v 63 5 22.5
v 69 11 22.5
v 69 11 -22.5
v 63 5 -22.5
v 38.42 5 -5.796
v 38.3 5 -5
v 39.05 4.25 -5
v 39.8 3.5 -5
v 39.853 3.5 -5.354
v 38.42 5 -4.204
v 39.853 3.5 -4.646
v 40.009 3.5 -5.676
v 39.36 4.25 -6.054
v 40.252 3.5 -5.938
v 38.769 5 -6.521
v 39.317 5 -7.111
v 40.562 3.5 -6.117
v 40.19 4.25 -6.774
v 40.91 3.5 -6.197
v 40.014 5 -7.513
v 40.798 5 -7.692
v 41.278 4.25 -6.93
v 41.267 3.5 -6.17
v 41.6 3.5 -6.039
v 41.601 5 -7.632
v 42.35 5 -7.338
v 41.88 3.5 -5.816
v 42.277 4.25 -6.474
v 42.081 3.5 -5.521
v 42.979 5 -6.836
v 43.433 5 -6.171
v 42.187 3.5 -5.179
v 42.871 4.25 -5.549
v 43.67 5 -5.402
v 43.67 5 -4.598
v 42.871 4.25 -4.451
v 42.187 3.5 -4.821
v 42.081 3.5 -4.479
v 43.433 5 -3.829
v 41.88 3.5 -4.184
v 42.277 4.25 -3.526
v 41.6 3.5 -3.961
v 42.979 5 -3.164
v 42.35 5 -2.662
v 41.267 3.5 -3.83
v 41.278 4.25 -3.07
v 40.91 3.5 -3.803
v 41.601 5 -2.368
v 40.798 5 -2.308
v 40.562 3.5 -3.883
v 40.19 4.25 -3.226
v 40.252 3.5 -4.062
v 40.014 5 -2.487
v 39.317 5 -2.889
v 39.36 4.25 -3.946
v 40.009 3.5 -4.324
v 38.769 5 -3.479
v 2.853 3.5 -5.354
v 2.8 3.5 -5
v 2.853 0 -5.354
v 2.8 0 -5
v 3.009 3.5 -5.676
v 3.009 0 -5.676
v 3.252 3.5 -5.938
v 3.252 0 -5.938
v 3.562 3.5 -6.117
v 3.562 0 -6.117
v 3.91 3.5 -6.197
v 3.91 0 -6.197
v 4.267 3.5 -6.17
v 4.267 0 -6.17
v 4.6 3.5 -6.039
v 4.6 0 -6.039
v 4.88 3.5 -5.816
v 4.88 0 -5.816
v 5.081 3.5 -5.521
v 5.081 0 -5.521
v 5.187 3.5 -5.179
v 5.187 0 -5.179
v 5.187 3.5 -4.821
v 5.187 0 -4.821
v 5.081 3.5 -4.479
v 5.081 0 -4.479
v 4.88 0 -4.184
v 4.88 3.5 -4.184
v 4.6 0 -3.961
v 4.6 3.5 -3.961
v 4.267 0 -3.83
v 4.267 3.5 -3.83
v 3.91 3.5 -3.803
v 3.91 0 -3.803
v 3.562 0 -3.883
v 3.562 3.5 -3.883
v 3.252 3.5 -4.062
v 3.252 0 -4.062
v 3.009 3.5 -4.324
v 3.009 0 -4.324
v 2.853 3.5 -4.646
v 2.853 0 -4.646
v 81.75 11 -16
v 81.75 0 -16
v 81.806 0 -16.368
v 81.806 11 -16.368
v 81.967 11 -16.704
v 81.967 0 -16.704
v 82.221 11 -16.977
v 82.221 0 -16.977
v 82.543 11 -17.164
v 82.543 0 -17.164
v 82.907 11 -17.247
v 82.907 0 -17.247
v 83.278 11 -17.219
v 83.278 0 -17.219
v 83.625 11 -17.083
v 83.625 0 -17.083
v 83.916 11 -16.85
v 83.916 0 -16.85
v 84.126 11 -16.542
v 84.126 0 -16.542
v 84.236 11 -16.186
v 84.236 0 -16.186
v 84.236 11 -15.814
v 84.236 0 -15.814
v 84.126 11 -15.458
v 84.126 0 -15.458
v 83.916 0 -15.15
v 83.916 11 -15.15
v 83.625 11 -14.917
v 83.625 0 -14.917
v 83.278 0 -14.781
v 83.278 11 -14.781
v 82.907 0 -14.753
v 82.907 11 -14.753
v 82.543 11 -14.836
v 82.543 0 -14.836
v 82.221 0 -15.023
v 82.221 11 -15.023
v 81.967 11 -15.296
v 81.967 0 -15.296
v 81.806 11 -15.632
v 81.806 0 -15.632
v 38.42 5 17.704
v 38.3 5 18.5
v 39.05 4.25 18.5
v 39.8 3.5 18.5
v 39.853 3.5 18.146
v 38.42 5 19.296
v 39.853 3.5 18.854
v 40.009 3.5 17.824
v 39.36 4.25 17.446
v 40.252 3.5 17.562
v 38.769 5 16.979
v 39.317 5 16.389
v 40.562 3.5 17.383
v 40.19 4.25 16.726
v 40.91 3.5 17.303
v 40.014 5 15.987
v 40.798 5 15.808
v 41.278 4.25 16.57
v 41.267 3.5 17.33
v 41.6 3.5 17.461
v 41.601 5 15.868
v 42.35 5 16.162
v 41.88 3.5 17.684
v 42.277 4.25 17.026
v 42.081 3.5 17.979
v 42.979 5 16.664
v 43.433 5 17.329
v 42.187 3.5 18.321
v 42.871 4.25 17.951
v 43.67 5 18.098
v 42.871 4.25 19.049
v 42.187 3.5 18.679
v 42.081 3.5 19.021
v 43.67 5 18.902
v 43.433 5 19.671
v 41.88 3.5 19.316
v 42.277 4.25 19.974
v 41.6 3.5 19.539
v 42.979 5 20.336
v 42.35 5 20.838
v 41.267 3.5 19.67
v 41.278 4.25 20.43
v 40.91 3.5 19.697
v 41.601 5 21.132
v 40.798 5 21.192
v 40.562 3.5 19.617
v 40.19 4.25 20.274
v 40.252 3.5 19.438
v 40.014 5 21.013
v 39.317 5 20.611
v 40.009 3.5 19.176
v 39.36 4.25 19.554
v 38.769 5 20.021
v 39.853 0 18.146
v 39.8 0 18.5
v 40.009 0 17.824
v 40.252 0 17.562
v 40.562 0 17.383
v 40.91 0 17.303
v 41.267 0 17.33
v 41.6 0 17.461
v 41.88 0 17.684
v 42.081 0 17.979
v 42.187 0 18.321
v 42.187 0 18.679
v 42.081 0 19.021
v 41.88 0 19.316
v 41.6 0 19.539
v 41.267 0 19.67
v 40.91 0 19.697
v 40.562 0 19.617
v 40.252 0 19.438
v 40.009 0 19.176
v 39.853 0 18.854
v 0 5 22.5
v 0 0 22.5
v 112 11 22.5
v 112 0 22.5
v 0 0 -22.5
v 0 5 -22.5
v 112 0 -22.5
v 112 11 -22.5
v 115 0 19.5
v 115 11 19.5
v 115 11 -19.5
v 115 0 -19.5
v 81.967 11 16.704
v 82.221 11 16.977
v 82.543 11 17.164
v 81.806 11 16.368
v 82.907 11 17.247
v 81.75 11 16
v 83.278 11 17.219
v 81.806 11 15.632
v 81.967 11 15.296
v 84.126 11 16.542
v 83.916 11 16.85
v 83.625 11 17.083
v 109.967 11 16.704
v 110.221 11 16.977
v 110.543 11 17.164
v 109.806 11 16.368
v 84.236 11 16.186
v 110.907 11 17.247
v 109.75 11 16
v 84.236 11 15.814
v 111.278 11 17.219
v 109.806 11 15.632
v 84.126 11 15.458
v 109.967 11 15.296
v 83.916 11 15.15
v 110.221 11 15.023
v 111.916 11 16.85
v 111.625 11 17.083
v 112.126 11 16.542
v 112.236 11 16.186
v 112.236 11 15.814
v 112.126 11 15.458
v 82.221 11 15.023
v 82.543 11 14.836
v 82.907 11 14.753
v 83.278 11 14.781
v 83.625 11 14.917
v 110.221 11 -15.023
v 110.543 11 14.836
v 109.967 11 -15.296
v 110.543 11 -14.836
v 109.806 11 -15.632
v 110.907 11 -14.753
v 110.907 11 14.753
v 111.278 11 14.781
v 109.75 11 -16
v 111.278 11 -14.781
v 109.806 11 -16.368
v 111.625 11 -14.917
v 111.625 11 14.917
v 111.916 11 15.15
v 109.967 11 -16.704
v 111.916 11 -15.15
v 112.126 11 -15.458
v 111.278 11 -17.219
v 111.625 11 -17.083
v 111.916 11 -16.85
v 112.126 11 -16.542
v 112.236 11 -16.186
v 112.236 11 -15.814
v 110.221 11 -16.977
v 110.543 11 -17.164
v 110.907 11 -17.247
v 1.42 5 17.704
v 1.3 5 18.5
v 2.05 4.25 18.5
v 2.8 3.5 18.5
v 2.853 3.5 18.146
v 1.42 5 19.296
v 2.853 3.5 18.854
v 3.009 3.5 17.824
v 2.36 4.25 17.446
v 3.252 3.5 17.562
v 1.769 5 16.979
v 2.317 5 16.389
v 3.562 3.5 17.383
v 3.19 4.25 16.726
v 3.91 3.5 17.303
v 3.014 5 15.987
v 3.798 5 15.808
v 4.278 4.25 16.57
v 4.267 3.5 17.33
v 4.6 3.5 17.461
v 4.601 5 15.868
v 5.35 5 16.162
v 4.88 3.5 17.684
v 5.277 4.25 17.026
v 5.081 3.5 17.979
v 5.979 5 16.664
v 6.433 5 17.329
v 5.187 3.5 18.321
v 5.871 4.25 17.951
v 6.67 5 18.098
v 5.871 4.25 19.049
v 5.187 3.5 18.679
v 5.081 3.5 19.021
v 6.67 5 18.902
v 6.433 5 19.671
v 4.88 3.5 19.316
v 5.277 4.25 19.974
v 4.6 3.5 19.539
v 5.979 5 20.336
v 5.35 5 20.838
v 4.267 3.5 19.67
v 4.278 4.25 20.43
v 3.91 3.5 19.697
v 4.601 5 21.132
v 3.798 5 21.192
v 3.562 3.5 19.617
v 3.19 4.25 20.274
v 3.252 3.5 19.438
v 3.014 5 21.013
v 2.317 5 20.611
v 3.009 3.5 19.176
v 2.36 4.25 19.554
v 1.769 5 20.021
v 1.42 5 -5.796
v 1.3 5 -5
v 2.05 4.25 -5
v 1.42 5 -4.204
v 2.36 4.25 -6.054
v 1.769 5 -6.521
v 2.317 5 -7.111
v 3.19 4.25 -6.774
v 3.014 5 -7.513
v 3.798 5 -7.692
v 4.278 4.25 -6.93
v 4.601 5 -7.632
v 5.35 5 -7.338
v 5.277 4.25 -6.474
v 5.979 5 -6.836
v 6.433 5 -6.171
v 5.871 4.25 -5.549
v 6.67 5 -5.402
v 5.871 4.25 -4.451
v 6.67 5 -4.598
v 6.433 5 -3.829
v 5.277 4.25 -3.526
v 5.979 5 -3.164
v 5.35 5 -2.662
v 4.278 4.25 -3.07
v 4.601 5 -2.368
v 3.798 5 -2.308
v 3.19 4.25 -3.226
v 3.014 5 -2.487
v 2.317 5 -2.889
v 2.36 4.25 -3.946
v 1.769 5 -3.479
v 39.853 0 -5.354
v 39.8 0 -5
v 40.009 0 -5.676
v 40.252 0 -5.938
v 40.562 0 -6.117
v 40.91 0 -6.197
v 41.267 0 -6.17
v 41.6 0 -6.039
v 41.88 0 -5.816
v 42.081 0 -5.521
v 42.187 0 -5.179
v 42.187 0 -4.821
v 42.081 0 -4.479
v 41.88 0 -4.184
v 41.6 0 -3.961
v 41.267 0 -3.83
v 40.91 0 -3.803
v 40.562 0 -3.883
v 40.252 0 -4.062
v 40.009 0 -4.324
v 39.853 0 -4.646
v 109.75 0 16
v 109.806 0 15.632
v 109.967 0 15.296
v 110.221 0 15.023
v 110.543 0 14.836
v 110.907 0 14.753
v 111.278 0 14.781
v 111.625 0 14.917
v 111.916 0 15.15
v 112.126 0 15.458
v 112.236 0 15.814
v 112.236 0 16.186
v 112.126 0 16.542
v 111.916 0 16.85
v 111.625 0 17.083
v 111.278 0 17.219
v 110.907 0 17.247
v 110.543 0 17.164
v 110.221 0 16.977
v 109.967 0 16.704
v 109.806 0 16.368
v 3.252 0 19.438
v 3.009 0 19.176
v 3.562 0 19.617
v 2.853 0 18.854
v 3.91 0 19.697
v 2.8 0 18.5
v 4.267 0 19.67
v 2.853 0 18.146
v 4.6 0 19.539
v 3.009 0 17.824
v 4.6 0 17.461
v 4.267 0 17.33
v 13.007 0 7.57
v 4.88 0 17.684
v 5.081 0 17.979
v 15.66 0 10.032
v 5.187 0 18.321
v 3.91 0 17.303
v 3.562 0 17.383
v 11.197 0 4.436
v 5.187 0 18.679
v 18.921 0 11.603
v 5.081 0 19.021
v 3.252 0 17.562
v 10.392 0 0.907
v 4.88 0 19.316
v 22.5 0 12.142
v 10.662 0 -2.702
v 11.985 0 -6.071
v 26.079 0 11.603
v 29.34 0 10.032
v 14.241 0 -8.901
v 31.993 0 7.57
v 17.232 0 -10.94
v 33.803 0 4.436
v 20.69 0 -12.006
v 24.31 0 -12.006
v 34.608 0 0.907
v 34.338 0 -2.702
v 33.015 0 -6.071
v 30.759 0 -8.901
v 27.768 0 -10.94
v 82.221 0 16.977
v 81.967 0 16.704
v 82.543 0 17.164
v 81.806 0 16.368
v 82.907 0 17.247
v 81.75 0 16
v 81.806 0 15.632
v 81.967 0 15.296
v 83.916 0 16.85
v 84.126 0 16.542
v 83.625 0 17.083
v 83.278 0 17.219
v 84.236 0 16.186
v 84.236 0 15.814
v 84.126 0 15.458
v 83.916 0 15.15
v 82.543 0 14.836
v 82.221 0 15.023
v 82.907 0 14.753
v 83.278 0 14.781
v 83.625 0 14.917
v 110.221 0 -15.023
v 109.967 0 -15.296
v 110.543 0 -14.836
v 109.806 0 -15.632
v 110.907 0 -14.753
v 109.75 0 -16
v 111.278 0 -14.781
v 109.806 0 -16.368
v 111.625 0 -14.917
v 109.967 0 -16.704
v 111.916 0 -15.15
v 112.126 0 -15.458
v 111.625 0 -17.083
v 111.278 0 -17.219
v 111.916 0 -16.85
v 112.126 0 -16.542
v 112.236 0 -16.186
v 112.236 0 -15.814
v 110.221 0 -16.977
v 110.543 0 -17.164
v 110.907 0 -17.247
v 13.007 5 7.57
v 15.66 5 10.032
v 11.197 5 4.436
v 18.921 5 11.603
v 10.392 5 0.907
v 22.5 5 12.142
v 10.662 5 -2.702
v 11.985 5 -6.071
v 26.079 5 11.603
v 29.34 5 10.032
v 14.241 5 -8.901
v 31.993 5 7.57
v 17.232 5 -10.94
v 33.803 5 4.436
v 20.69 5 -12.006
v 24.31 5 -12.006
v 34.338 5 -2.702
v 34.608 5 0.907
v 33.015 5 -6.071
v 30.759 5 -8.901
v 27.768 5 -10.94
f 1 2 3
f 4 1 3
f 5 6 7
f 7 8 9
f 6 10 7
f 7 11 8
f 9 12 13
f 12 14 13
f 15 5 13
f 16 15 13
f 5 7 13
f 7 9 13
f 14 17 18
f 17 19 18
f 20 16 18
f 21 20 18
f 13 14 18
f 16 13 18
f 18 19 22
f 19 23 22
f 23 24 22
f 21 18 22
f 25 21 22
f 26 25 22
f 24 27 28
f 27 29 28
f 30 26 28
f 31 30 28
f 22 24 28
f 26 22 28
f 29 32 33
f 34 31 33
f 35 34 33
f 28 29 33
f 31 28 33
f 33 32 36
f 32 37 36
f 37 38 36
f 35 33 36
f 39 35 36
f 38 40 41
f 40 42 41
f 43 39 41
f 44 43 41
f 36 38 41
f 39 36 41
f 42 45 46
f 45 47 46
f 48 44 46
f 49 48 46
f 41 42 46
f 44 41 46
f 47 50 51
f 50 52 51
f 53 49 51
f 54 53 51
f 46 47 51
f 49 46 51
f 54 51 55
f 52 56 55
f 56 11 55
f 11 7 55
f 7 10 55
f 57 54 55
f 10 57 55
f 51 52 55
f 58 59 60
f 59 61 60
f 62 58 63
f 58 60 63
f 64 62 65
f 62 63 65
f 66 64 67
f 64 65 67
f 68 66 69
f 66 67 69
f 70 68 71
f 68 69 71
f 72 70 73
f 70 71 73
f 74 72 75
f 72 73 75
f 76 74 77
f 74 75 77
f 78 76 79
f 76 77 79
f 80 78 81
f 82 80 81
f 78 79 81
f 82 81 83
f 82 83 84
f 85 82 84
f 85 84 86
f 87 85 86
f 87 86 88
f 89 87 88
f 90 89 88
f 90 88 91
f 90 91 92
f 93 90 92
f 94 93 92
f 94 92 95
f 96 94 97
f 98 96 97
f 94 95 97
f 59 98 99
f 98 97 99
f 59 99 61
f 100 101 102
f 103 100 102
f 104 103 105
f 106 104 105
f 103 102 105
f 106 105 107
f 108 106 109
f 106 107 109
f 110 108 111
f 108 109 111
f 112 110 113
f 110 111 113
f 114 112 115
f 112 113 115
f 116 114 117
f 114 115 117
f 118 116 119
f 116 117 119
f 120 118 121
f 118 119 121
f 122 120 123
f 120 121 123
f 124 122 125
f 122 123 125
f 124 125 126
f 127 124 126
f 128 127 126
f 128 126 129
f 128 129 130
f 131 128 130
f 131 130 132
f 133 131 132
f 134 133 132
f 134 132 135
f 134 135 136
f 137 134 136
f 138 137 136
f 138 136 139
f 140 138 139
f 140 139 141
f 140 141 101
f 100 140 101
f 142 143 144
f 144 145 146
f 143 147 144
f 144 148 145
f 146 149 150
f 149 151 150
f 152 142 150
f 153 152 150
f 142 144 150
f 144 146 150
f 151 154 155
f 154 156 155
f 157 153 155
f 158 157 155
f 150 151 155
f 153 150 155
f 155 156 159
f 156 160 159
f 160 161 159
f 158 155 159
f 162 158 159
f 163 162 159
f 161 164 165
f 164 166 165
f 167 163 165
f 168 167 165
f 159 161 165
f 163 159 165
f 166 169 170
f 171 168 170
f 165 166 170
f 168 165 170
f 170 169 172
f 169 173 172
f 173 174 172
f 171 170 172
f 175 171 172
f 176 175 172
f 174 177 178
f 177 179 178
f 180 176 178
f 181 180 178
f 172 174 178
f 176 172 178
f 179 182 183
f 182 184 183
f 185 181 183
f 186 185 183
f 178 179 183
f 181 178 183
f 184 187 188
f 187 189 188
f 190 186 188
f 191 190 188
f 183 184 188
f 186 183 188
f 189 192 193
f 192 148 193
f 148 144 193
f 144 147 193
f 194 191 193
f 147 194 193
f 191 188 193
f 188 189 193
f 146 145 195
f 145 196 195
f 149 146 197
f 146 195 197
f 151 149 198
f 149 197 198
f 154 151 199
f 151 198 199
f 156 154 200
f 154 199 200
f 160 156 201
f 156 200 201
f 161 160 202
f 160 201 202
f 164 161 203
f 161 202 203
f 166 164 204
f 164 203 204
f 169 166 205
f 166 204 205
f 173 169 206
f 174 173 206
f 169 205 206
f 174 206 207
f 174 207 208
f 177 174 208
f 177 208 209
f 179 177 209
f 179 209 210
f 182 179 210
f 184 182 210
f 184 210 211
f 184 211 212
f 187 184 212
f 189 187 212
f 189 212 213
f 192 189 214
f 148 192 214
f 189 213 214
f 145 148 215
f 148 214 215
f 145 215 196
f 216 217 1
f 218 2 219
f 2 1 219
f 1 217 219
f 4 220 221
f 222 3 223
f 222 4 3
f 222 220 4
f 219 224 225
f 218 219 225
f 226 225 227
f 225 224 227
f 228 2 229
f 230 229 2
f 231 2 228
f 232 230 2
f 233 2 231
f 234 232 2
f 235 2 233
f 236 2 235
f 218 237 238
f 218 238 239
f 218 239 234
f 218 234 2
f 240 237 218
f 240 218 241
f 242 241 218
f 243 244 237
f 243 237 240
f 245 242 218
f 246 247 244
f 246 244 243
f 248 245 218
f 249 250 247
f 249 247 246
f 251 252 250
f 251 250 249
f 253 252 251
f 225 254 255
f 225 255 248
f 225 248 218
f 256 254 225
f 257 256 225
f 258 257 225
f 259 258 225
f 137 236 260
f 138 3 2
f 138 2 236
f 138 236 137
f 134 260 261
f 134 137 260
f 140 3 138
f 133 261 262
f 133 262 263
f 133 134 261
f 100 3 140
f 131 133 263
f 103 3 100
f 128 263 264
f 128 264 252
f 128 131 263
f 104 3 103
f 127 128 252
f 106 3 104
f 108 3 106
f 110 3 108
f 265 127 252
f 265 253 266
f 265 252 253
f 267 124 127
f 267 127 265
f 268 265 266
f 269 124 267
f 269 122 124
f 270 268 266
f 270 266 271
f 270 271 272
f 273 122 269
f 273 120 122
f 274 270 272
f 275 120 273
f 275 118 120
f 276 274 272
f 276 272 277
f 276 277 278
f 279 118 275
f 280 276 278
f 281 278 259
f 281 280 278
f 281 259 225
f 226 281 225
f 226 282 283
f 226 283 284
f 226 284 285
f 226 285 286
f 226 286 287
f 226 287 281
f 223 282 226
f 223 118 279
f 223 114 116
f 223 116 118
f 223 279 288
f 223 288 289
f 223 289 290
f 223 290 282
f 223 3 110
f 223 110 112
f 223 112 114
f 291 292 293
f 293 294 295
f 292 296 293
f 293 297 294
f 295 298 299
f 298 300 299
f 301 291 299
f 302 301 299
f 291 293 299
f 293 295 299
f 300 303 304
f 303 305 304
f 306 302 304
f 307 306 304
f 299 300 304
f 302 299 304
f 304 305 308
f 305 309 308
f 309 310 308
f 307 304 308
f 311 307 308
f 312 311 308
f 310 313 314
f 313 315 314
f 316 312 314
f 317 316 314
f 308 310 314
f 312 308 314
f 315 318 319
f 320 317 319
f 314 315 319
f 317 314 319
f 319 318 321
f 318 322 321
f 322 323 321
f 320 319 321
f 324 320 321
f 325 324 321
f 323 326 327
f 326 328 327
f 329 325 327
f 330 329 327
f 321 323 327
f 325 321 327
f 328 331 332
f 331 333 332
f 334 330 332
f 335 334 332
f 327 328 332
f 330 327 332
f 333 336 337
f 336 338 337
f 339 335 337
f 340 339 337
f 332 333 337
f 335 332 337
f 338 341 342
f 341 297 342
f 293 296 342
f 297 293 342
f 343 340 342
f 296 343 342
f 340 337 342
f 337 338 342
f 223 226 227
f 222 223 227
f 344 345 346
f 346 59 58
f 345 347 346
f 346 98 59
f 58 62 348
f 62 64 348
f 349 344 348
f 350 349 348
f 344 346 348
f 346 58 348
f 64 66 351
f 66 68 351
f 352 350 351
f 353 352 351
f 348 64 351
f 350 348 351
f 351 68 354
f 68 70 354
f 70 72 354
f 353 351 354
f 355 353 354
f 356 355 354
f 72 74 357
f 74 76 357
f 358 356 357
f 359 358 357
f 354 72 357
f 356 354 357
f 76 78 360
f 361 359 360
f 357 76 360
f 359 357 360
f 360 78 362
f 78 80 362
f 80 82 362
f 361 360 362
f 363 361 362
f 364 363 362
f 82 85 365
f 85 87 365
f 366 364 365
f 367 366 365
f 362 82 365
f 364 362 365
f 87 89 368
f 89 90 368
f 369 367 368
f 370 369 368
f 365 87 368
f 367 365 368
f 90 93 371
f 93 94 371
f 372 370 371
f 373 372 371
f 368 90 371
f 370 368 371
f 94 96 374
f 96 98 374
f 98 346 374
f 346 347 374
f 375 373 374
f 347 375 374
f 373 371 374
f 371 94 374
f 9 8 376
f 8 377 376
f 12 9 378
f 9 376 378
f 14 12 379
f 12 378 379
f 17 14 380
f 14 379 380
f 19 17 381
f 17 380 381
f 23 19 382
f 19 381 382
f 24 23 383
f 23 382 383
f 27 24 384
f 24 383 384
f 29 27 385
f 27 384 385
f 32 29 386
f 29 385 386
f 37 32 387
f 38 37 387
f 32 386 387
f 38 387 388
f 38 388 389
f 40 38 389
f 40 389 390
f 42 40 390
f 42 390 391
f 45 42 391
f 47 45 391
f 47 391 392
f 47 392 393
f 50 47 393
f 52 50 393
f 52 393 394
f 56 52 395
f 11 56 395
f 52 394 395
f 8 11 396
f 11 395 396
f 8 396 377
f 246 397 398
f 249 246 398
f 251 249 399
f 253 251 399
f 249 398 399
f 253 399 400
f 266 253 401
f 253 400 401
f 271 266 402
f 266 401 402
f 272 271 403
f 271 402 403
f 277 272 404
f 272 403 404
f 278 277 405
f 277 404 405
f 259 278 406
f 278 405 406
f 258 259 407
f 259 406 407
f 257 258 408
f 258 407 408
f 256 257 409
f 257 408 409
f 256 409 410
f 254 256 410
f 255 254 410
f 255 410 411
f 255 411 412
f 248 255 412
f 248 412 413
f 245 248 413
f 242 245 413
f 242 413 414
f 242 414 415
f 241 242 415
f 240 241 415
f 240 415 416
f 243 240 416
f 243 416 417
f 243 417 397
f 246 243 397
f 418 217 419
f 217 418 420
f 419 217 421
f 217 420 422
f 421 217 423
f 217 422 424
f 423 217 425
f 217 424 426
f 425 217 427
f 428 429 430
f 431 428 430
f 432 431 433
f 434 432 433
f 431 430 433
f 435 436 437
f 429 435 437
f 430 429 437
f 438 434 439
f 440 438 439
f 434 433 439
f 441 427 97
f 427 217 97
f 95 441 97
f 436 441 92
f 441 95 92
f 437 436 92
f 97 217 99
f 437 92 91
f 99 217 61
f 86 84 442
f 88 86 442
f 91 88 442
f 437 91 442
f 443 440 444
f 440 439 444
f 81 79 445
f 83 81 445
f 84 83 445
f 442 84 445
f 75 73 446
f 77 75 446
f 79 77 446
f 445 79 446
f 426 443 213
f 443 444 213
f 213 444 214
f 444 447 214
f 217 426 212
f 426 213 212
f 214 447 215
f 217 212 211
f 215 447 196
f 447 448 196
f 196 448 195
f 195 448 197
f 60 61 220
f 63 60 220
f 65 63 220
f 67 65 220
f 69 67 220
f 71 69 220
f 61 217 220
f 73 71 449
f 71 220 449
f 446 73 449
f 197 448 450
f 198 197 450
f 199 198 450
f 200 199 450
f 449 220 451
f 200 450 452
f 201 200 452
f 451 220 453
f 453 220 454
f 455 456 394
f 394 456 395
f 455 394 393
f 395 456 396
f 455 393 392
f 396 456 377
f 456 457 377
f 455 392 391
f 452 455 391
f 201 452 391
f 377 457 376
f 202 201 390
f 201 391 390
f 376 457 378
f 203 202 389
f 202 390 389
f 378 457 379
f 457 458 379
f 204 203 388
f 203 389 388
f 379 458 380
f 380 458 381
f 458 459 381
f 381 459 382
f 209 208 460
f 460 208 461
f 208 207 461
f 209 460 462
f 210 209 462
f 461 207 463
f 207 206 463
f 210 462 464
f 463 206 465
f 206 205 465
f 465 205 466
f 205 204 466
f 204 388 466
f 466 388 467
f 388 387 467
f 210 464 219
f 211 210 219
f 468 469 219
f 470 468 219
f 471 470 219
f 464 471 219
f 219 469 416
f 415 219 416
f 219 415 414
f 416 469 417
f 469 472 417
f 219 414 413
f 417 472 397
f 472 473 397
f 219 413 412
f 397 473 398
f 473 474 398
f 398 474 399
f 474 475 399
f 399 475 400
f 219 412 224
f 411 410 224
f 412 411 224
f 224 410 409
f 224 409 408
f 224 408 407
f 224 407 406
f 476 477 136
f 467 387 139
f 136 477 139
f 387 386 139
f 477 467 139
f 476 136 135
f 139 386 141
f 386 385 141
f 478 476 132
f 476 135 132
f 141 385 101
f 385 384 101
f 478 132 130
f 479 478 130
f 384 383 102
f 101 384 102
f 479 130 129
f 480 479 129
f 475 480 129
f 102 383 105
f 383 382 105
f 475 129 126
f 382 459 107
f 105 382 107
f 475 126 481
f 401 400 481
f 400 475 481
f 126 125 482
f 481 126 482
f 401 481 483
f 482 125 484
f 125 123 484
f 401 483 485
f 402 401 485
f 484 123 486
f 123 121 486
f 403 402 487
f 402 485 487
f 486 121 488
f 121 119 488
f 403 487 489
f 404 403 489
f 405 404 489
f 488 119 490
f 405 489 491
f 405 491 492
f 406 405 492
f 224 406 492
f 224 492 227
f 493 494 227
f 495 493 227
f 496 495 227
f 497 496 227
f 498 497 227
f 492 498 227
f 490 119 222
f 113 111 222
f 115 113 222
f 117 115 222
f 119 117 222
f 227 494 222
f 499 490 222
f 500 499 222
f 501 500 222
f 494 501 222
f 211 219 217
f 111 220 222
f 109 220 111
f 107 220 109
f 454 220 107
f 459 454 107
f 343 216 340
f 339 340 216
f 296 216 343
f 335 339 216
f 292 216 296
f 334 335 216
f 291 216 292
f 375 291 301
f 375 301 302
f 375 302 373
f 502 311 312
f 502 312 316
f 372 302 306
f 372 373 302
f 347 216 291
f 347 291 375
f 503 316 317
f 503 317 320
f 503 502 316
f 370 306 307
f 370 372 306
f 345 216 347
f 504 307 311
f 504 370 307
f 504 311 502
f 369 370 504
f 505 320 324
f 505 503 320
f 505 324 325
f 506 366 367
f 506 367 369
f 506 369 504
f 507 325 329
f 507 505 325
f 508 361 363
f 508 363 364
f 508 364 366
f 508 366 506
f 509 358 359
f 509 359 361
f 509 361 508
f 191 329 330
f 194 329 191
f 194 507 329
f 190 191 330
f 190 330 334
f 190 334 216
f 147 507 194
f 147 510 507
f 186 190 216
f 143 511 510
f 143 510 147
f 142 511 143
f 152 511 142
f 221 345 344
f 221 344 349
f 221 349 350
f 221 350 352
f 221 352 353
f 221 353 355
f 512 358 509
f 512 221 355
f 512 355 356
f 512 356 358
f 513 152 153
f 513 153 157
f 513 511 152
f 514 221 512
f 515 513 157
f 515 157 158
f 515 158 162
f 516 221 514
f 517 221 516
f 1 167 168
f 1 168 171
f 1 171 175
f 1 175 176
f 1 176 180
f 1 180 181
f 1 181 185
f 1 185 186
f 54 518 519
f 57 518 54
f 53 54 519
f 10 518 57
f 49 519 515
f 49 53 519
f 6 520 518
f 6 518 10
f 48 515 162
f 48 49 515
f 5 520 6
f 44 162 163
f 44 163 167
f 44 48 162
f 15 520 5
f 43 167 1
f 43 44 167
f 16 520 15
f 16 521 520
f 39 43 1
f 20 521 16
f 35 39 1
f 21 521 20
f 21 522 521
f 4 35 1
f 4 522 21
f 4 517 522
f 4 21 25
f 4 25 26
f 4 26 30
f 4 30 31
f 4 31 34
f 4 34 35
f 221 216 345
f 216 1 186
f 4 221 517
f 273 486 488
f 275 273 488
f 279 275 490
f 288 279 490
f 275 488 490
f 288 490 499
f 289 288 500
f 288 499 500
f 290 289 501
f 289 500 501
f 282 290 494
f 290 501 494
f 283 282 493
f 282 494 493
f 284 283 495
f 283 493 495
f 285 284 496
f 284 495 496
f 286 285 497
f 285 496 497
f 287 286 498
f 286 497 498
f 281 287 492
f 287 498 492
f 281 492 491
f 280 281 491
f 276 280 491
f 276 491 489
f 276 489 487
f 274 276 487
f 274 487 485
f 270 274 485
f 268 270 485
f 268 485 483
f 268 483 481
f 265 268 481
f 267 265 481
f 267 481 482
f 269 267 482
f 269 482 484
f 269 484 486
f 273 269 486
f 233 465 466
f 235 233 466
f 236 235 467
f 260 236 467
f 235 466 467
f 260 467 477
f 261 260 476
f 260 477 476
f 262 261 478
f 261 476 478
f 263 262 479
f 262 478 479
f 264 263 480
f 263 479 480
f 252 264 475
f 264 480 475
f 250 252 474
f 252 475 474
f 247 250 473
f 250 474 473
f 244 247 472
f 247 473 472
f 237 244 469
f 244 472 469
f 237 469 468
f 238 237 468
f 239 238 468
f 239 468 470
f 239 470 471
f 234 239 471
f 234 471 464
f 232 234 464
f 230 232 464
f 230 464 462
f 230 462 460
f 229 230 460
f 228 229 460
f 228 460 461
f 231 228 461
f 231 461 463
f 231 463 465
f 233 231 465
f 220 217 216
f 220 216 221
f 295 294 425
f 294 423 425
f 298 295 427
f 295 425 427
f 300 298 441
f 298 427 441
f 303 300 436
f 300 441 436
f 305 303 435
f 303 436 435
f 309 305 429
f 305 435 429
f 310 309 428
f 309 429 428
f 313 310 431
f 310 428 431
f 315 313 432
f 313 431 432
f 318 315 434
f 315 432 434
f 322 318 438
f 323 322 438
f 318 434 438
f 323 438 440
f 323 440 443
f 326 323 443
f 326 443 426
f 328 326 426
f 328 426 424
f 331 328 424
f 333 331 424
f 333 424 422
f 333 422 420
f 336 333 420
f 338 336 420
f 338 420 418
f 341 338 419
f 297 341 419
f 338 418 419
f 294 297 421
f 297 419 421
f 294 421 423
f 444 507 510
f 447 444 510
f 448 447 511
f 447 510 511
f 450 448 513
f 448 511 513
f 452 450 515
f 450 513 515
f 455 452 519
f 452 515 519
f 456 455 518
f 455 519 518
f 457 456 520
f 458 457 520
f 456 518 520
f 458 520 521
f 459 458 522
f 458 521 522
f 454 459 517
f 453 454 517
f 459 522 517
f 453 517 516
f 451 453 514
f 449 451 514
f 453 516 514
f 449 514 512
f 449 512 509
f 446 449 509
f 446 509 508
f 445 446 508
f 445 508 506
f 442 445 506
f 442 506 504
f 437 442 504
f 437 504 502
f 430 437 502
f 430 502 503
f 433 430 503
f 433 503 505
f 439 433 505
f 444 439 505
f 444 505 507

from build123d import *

# Parameters (mm, degrees)
SKETCH1_W                                           = 115
SKETCH1_H                                           = 45
BOSS_EXTRUDE1_DEPTH                                 = 5
CUT_EXTRUDE1_REACH                                  = 119.287
SKETCH2_R                                           = 12.142
CSK_FOR_M2_COUNTERSUNK_FLAT_HEAD_SCREW1_D           = 2.4
CSK_FOR_M2_COUNTERSUNK_FLAT_HEAD_SCREW1_CSINK_D     = 5.4
CSK_FOR_M2_COUNTERSUNK_FLAT_HEAD_SCREW1_CSINK_ANGLE = 90
SKETCH13_W                                          = 52
SKETCH13_H                                          = 45
BOSS_EXTRUDE4_DEPTH                                 = 6
CHAMFER2_SIZE                                       = 6
M3_TAPPED_HOLE1_D                                   = 2.5
CHAMFER1_SIZE                                       = 3


with BuildPart() as part:
    # Sketch1 → Boss-Extrude1 (new body)
    with BuildSketch(Plane(origin=(0, 0, 0), x_dir=(1, 0, 0), z_dir=(0, 1, 0))):
        with Locations((57.5, 0)):
            Rectangle(SKETCH1_W, SKETCH1_H)
    extrude(amount=BOSS_EXTRUDE1_DEPTH)

    # Sketch2 → Cut-Extrude1 (cut, up to next)
    with BuildSketch(Plane(origin=(0, 5, 0), x_dir=(1, 0, 0), z_dir=(0, 1, 0)), mode=Mode.PRIVATE) as cut_extrude1_sk1:
        with Locations(Location((22.5, 0, 0), (0, 0, 270))):
            Circle(SKETCH2_R)
    cut_extrude1_tool1 = extrude(cut_extrude1_sk1.sketch, amount=-CUT_EXTRUDE1_REACH, mode=Mode.PRIVATE) & part.part
    add(cut_extrude1_tool1.solids().sort_by_distance((22.5, 5, 0))[0], mode=Mode.SUBTRACT)

    # CSK for M2 Countersunk Flat Head Screw1 (through all)
    with Locations(Plane(origin=(0, 5, 0), x_dir=(1, 0, 0), z_dir=(0, 1, 0))):
        with Locations((4, -18.5), (41, -18.5), (41, 5), (4, 5)):
            CounterSinkHole(CSK_FOR_M2_COUNTERSUNK_FLAT_HEAD_SCREW1_D / 2, CSK_FOR_M2_COUNTERSUNK_FLAT_HEAD_SCREW1_CSINK_D / 2, counter_sink_angle=CSK_FOR_M2_COUNTERSUNK_FLAT_HEAD_SCREW1_CSINK_ANGLE)

    # Sketch13 → Boss-Extrude4 (add)
    with BuildSketch(Plane(origin=(0, 5, 0), x_dir=(1, 0, 0), z_dir=(0, 1, 0))):
        with Locations((89, 0)):
            Rectangle(SKETCH13_W, SKETCH13_H)
    extrude(amount=BOSS_EXTRUDE4_DEPTH)

    # Chamfer2
    chamfer2_edges = [part.edges().sort_by_distance(p)[0] for p in [
        (63, 11, 0),
    ]]
    chamfer(chamfer2_edges, length=CHAMFER2_SIZE - 0.0001)  # a hair under: the kernel refuses the full size

    # M3 Tapped Hole1 (through all)
    with Locations(Plane(origin=(0, 11, 0), x_dir=(1, 0, 0), z_dir=(0, 1, 0))):
        with Locations((83, 16), (111, 16), (83, -16), (111, -16)):
            Hole(M3_TAPPED_HOLE1_D / 2)

    # Chamfer1
    chamfer1_edges = [part.edges().sort_by_distance(p)[0] for p in [
        (115, 5.5, -22.5),
        (115, 5.5, 22.5),
    ]]
    chamfer(chamfer1_edges, length=CHAMFER1_SIZE)


solid = part.part
